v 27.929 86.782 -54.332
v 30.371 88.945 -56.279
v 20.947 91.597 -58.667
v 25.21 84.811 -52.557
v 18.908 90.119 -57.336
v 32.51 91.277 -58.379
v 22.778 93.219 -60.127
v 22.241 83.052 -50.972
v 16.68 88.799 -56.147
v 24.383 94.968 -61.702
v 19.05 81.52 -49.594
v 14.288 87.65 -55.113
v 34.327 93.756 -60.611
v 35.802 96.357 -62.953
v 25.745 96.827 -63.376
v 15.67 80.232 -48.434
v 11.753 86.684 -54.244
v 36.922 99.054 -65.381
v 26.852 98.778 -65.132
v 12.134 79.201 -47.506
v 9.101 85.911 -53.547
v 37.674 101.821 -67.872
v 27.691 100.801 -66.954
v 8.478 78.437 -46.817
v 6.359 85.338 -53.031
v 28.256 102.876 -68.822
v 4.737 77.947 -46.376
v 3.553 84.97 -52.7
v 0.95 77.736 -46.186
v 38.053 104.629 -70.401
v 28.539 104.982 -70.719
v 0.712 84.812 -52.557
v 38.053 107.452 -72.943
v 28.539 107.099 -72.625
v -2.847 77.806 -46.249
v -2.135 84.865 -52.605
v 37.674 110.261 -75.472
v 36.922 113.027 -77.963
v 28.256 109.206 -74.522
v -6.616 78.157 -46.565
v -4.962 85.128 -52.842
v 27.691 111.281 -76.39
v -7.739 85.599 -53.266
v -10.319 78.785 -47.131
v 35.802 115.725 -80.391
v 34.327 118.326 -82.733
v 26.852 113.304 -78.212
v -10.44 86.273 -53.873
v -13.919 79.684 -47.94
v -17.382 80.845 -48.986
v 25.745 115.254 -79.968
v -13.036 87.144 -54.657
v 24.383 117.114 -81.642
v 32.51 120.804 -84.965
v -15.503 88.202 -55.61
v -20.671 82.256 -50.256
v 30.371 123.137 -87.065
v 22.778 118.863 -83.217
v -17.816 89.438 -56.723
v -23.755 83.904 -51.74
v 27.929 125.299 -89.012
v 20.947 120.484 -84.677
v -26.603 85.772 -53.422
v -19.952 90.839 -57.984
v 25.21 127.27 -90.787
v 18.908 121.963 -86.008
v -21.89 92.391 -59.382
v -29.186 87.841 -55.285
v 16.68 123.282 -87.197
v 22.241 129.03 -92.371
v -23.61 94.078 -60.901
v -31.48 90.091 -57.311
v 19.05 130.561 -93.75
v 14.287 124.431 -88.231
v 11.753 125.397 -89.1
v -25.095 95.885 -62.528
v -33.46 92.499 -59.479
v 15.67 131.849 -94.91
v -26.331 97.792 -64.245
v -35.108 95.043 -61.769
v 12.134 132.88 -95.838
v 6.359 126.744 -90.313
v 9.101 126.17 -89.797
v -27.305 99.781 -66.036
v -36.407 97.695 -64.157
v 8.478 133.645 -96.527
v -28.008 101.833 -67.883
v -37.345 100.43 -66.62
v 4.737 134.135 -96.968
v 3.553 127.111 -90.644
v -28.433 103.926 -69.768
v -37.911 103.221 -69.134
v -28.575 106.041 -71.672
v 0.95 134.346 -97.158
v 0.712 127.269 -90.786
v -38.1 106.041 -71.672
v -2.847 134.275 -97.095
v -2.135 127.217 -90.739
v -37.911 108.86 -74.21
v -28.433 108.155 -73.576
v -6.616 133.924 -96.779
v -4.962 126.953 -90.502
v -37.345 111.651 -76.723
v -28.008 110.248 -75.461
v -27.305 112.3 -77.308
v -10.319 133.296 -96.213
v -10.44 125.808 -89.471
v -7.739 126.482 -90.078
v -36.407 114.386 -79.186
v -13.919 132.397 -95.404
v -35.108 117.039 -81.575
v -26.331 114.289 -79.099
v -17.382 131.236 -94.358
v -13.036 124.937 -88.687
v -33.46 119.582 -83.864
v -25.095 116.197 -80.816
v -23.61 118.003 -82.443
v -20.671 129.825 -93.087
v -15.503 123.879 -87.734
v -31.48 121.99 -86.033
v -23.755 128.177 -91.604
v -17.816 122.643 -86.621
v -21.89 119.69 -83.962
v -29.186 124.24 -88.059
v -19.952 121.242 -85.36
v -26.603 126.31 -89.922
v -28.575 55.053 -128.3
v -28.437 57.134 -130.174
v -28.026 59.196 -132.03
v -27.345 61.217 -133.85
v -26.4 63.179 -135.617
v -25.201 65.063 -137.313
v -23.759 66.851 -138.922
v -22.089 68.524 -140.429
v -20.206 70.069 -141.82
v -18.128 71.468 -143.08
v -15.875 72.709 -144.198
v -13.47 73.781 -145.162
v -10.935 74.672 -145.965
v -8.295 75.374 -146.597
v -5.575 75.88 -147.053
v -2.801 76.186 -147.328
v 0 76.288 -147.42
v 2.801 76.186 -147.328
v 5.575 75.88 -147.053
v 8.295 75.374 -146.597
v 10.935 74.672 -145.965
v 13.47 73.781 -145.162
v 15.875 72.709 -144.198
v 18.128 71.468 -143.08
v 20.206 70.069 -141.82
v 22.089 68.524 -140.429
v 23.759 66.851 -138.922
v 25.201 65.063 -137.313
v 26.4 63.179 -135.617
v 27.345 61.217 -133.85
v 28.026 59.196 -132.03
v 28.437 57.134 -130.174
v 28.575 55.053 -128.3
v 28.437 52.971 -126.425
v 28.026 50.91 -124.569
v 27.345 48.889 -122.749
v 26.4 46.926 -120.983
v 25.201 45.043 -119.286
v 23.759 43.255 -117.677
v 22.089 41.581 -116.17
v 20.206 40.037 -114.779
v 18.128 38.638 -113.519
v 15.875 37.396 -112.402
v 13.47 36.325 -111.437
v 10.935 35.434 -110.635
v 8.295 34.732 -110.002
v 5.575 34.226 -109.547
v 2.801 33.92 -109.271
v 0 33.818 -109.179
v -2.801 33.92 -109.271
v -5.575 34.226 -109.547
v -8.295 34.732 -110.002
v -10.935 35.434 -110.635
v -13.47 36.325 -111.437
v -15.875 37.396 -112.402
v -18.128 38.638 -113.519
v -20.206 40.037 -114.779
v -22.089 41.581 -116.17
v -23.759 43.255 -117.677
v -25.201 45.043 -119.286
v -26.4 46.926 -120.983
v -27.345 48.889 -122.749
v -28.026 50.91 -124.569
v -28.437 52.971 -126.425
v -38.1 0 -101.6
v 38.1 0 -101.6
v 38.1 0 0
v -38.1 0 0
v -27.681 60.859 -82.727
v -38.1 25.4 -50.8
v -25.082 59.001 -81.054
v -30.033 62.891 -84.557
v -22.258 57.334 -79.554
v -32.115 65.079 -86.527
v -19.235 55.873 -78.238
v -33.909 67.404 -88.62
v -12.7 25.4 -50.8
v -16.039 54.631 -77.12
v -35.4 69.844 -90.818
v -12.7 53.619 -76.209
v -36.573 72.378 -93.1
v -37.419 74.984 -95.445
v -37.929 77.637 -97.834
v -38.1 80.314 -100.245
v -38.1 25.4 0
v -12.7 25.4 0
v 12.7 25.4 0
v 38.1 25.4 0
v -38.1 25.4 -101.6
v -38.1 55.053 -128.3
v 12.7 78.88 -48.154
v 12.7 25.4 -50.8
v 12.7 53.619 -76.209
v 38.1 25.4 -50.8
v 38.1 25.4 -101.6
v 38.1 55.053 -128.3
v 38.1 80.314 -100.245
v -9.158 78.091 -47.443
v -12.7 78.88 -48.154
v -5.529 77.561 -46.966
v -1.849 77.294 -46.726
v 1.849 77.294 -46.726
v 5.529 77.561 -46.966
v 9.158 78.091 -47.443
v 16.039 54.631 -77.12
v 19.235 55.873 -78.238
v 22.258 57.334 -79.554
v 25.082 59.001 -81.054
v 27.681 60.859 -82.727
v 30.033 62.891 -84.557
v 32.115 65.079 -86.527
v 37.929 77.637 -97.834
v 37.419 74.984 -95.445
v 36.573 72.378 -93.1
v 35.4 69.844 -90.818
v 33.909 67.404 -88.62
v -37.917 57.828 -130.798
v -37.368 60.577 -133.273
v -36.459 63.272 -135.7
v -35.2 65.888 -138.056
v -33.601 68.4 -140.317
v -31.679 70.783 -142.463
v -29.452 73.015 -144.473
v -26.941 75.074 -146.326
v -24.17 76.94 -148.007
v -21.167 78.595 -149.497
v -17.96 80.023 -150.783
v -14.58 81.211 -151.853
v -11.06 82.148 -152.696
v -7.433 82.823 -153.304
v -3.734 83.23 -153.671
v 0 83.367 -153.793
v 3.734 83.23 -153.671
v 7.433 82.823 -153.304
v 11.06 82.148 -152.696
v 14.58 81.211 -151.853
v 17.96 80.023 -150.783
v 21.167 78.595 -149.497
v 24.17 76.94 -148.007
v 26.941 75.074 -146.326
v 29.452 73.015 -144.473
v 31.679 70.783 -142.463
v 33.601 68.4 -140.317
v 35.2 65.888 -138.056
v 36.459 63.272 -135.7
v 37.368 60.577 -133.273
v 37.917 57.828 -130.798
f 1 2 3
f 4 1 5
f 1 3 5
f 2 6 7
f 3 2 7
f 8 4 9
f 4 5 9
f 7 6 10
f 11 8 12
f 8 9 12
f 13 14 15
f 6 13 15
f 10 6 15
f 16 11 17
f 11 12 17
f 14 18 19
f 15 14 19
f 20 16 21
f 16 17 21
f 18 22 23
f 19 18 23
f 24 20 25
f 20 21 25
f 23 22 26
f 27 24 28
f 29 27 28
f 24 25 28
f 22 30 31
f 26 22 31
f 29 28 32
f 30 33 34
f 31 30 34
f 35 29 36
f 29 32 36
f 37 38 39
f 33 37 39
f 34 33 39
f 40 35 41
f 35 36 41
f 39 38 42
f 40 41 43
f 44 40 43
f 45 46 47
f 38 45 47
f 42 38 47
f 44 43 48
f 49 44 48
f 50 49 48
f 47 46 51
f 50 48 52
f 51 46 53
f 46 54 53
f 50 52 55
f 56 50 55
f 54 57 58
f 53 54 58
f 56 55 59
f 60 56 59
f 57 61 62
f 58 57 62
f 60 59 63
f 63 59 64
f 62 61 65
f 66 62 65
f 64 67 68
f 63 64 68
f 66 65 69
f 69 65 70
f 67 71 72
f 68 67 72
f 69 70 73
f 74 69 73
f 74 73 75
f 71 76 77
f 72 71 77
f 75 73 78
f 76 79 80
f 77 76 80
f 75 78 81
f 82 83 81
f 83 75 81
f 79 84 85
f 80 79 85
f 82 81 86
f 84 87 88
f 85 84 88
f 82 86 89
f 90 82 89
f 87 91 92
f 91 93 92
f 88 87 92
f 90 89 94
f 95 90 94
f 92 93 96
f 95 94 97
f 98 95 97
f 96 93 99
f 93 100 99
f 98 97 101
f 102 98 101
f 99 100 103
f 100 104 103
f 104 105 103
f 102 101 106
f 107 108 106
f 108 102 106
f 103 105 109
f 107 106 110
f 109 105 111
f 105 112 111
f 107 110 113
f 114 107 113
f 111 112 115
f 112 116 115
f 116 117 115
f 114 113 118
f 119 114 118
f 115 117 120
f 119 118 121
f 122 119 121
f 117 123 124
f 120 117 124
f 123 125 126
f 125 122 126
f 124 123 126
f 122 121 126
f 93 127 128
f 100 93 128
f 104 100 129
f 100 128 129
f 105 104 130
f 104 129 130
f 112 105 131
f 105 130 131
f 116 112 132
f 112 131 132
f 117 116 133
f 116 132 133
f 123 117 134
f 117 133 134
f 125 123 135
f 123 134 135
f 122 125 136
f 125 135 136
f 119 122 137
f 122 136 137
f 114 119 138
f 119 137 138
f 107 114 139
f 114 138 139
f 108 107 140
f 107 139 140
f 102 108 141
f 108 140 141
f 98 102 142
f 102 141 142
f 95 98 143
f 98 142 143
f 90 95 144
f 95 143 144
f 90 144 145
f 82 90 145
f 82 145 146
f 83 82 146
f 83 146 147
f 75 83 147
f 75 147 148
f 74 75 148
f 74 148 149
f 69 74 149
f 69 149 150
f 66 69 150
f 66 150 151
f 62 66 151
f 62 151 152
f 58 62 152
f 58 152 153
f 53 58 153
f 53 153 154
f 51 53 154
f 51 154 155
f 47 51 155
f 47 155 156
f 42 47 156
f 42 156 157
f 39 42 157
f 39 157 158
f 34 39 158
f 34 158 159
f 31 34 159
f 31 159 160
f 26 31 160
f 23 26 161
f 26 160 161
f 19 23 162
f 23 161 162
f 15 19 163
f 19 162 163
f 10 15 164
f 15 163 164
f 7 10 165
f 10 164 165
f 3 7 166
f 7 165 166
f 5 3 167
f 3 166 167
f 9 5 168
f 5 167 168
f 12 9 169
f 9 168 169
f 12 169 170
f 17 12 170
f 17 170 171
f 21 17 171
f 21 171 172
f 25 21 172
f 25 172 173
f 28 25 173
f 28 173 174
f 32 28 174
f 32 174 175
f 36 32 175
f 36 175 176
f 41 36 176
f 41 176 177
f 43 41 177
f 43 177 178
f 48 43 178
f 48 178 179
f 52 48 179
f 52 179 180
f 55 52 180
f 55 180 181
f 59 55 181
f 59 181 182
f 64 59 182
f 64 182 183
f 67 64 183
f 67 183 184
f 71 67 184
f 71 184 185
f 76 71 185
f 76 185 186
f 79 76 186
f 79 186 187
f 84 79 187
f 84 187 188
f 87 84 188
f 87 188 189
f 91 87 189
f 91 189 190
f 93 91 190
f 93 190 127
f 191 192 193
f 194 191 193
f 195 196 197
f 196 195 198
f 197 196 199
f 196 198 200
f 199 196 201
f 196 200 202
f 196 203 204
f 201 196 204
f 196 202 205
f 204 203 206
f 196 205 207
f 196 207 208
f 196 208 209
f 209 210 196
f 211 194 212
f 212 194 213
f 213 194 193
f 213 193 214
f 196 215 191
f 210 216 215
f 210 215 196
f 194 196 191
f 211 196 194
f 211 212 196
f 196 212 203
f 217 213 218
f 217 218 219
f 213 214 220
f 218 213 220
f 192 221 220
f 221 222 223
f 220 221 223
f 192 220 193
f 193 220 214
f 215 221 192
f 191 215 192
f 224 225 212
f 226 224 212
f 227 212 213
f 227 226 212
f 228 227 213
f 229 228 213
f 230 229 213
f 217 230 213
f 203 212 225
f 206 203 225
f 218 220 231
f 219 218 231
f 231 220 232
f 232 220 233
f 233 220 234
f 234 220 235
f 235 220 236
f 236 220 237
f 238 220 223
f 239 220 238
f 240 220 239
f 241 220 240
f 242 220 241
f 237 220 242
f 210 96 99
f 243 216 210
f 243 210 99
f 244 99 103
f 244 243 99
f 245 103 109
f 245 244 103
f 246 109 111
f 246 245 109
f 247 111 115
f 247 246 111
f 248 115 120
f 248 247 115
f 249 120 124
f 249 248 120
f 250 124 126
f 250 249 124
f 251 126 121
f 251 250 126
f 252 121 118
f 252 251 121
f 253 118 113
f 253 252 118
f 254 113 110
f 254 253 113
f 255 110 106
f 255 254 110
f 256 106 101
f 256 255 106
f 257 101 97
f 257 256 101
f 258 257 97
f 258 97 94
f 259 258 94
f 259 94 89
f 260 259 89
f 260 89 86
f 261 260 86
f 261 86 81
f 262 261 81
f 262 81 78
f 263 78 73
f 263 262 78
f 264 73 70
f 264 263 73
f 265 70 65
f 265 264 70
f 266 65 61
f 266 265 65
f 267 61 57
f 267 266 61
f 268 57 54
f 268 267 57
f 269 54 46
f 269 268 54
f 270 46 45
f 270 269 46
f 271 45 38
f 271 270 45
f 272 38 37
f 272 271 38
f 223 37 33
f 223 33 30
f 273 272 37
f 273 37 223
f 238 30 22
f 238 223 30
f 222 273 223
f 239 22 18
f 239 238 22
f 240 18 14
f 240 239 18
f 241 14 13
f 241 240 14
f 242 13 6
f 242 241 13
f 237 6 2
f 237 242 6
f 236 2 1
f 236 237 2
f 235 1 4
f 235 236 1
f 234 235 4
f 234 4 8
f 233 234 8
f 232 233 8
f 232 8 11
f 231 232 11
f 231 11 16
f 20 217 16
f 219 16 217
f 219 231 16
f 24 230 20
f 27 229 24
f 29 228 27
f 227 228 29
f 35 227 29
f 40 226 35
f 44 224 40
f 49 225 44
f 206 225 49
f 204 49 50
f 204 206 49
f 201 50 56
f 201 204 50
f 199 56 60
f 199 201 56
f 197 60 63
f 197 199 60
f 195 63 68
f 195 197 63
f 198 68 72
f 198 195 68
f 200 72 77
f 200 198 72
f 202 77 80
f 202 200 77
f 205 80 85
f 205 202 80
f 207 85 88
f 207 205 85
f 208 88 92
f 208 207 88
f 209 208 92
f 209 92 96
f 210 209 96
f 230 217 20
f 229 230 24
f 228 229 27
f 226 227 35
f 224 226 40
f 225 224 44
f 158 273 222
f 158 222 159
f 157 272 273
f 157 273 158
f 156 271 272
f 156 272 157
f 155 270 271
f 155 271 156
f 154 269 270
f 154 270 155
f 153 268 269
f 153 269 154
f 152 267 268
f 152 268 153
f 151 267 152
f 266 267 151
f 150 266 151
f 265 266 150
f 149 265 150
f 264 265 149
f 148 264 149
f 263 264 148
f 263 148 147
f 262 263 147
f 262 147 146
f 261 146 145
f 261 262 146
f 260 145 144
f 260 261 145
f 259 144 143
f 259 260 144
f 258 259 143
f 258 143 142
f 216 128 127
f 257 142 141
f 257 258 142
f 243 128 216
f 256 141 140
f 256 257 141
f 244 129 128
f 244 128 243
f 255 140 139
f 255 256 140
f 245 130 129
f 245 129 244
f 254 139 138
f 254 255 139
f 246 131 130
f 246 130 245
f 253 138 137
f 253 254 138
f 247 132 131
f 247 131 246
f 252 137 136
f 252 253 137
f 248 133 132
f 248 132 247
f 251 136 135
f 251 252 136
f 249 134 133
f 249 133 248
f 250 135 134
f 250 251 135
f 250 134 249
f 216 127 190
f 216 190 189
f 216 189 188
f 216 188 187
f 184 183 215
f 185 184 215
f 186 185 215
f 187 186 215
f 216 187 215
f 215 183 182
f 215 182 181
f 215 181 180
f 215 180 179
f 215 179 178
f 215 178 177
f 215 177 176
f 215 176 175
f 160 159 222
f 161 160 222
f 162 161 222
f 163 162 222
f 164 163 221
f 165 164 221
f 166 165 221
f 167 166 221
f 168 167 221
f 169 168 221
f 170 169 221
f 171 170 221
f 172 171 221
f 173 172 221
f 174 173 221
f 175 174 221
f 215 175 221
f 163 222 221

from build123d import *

# Parameters (mm, degrees)
BOSS_EXTRUDE1_DEPTH = 38.1
BOSS_EXTRUDE2_REACH = 114.341
SKETCH3_W           = 25.4
SKETCH3_H           = 88.161149917
SKETCH4_R           = 38.1
BOSS_EXTRUDE3_DEPTH = 76.2
SKETCH5_R           = 28.575
CUT_EXTRUDE1_DEPTH  = 76.2


with BuildPart() as part:
    # Sketch1 → Boss-Extrude1 (new body, symmetric)
    with BuildSketch(Plane(origin=(0, 0, 0), x_dir=(0, 0, -1), z_dir=(1, 0, 0))):
        Polygon((0, 0), (0, 25.4), (50.8, 25.4), (100.244555556, 80.313742191), (128.299578523, 55.052886048), (101.6, 25.4), (101.6, 0), align=None)
    extrude(amount=BOSS_EXTRUDE1_DEPTH, both=True)

    # Sketch3 → Boss-Extrude2 (add, up to next)
    with BuildSketch(Plane(origin=(0, 11.372488517, 12.630428071), x_dir=(1, 0, 0), z_dir=(0, 0.669130606, 0.743144825)), mode=Mode.PRIVATE) as boss_extrude2_sk1:
        with Locations((0, 62.956453526)):
            Rectangle(SKETCH3_W, SKETCH3_H)
    boss_extrude2_tool1 = extrude(boss_extrude2_sk1.sketch, amount=-BOSS_EXTRUDE2_REACH, mode=Mode.PRIVATE) - part.part
    add(boss_extrude2_tool1.solids().sort_by_distance((0, 58.158251, -29.495662))[0])

    # Sketch4 → Boss-Extrude3 (add)
    with BuildSketch(Plane(origin=(0, -39.149223768, -43.479617863), x_dir=(-1, 0, 0), z_dir=(0, -0.669130606, -0.743144825))):
        with Locations((0, 126.761442167)):
            Circle(SKETCH4_R)
    extrude(amount=-BOSS_EXTRUDE3_DEPTH)

    # Sketch5 → Cut-Extrude1 (cut)
    with BuildSketch(Plane(origin=(0, -39.149223768, -43.479617863), x_dir=(-1, 0, 0), z_dir=(0, -0.669130606, -0.743144825))):
        with Locations((0, 126.761442167)):
            Circle(SKETCH5_R)
    extrude(amount=-CUT_EXTRUDE1_DEPTH, mode=Mode.SUBTRACT)


solid = part.part
